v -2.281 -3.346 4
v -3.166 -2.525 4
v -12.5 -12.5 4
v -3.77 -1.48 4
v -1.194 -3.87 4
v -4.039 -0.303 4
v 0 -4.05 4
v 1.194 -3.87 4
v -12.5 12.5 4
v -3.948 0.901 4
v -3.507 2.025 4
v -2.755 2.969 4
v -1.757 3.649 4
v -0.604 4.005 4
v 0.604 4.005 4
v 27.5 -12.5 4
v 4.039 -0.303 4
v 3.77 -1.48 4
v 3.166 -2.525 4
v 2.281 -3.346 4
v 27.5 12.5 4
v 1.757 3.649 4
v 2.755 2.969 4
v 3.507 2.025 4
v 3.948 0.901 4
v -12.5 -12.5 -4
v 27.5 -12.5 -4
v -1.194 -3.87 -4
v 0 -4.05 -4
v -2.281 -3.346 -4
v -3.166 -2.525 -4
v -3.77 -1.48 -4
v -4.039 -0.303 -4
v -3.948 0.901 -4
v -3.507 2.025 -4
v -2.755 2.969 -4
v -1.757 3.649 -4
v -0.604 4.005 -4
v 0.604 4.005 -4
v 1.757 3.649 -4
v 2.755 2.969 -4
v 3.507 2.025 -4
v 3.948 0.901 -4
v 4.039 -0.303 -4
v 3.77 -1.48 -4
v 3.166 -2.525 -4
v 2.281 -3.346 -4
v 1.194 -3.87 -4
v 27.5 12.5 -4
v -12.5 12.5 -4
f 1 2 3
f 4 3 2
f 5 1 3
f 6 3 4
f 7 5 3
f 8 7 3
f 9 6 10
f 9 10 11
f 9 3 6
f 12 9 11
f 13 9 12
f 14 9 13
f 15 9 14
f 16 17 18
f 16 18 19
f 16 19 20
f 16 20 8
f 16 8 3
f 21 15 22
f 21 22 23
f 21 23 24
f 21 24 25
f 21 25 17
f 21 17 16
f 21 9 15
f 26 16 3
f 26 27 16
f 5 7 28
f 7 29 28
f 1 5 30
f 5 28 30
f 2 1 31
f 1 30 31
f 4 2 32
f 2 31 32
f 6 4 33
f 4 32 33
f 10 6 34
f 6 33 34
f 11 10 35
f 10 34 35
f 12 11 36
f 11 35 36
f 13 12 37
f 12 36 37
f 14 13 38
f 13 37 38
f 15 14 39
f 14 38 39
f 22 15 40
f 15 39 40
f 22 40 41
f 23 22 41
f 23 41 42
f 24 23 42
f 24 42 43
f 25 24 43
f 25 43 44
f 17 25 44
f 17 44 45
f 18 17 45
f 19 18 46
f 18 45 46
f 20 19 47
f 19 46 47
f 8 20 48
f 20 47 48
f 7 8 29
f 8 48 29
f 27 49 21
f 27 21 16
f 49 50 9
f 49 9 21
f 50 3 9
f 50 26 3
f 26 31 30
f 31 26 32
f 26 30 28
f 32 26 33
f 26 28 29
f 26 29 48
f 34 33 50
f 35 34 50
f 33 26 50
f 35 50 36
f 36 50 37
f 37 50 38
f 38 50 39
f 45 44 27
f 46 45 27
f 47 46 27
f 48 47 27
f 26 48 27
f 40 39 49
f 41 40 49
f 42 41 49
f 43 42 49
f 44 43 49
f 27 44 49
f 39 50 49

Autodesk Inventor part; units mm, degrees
ref_plane "YZ Plane" through (0, 0, 0) normal (1, 0, 0) x (0, 1, 0)
ref_plane "XZ Plane" through (0, 0, 0) normal (0, 1, 0) x (-1, 0, 0)
ref_plane "XY Plane" through (0, 0, 0) normal (0, 0, 1) x (1, 0, 0)
sketch "Sketch1" plane through (0, 0, 0) normal (0, 0, 1) x (1, 0, 0)
  line L0 (-12.5, 12.5) -> (12.5, 12.5)
  line L1 (27.5, 12.5) -> (27.5, -12.5)
  line L2 (12.5, -12.5) -> (-12.5, -12.5)
  line L3 (-12.5, -12.5) -> (-12.5, 12.5)
  line L4 (-12.5, 12.5) -> (12.5, -12.5) construction
  line L5 (12.5, 12.5) -> (-12.5, -12.5) construction
  line L6 (12.5, 12.5) -> (12.5, -12.5) construction
  line L7 (12.5, 12.5) -> (27.5, 12.5)
  line L8 (12.5, -12.5) -> (27.5, -12.5)
  point P0 (0, 0)
  point P1 (0, 0)
  dimension "d0" = 25
  dimension "d1" = 15
extrude "Extrusion1" add sketch "Sketch1" along normal mid plane 8
sketch "Sketch2" plane through (0, 0, 4) normal (0, 0, 1) x (1, 0, 0)
  point P0 (0, 0)
hole "Hole1" at (0, 0, 4) direction (0, 0, -1) diameter 8.1 end through all
properties part number "BoltRelease" material "ABS Plastic"
